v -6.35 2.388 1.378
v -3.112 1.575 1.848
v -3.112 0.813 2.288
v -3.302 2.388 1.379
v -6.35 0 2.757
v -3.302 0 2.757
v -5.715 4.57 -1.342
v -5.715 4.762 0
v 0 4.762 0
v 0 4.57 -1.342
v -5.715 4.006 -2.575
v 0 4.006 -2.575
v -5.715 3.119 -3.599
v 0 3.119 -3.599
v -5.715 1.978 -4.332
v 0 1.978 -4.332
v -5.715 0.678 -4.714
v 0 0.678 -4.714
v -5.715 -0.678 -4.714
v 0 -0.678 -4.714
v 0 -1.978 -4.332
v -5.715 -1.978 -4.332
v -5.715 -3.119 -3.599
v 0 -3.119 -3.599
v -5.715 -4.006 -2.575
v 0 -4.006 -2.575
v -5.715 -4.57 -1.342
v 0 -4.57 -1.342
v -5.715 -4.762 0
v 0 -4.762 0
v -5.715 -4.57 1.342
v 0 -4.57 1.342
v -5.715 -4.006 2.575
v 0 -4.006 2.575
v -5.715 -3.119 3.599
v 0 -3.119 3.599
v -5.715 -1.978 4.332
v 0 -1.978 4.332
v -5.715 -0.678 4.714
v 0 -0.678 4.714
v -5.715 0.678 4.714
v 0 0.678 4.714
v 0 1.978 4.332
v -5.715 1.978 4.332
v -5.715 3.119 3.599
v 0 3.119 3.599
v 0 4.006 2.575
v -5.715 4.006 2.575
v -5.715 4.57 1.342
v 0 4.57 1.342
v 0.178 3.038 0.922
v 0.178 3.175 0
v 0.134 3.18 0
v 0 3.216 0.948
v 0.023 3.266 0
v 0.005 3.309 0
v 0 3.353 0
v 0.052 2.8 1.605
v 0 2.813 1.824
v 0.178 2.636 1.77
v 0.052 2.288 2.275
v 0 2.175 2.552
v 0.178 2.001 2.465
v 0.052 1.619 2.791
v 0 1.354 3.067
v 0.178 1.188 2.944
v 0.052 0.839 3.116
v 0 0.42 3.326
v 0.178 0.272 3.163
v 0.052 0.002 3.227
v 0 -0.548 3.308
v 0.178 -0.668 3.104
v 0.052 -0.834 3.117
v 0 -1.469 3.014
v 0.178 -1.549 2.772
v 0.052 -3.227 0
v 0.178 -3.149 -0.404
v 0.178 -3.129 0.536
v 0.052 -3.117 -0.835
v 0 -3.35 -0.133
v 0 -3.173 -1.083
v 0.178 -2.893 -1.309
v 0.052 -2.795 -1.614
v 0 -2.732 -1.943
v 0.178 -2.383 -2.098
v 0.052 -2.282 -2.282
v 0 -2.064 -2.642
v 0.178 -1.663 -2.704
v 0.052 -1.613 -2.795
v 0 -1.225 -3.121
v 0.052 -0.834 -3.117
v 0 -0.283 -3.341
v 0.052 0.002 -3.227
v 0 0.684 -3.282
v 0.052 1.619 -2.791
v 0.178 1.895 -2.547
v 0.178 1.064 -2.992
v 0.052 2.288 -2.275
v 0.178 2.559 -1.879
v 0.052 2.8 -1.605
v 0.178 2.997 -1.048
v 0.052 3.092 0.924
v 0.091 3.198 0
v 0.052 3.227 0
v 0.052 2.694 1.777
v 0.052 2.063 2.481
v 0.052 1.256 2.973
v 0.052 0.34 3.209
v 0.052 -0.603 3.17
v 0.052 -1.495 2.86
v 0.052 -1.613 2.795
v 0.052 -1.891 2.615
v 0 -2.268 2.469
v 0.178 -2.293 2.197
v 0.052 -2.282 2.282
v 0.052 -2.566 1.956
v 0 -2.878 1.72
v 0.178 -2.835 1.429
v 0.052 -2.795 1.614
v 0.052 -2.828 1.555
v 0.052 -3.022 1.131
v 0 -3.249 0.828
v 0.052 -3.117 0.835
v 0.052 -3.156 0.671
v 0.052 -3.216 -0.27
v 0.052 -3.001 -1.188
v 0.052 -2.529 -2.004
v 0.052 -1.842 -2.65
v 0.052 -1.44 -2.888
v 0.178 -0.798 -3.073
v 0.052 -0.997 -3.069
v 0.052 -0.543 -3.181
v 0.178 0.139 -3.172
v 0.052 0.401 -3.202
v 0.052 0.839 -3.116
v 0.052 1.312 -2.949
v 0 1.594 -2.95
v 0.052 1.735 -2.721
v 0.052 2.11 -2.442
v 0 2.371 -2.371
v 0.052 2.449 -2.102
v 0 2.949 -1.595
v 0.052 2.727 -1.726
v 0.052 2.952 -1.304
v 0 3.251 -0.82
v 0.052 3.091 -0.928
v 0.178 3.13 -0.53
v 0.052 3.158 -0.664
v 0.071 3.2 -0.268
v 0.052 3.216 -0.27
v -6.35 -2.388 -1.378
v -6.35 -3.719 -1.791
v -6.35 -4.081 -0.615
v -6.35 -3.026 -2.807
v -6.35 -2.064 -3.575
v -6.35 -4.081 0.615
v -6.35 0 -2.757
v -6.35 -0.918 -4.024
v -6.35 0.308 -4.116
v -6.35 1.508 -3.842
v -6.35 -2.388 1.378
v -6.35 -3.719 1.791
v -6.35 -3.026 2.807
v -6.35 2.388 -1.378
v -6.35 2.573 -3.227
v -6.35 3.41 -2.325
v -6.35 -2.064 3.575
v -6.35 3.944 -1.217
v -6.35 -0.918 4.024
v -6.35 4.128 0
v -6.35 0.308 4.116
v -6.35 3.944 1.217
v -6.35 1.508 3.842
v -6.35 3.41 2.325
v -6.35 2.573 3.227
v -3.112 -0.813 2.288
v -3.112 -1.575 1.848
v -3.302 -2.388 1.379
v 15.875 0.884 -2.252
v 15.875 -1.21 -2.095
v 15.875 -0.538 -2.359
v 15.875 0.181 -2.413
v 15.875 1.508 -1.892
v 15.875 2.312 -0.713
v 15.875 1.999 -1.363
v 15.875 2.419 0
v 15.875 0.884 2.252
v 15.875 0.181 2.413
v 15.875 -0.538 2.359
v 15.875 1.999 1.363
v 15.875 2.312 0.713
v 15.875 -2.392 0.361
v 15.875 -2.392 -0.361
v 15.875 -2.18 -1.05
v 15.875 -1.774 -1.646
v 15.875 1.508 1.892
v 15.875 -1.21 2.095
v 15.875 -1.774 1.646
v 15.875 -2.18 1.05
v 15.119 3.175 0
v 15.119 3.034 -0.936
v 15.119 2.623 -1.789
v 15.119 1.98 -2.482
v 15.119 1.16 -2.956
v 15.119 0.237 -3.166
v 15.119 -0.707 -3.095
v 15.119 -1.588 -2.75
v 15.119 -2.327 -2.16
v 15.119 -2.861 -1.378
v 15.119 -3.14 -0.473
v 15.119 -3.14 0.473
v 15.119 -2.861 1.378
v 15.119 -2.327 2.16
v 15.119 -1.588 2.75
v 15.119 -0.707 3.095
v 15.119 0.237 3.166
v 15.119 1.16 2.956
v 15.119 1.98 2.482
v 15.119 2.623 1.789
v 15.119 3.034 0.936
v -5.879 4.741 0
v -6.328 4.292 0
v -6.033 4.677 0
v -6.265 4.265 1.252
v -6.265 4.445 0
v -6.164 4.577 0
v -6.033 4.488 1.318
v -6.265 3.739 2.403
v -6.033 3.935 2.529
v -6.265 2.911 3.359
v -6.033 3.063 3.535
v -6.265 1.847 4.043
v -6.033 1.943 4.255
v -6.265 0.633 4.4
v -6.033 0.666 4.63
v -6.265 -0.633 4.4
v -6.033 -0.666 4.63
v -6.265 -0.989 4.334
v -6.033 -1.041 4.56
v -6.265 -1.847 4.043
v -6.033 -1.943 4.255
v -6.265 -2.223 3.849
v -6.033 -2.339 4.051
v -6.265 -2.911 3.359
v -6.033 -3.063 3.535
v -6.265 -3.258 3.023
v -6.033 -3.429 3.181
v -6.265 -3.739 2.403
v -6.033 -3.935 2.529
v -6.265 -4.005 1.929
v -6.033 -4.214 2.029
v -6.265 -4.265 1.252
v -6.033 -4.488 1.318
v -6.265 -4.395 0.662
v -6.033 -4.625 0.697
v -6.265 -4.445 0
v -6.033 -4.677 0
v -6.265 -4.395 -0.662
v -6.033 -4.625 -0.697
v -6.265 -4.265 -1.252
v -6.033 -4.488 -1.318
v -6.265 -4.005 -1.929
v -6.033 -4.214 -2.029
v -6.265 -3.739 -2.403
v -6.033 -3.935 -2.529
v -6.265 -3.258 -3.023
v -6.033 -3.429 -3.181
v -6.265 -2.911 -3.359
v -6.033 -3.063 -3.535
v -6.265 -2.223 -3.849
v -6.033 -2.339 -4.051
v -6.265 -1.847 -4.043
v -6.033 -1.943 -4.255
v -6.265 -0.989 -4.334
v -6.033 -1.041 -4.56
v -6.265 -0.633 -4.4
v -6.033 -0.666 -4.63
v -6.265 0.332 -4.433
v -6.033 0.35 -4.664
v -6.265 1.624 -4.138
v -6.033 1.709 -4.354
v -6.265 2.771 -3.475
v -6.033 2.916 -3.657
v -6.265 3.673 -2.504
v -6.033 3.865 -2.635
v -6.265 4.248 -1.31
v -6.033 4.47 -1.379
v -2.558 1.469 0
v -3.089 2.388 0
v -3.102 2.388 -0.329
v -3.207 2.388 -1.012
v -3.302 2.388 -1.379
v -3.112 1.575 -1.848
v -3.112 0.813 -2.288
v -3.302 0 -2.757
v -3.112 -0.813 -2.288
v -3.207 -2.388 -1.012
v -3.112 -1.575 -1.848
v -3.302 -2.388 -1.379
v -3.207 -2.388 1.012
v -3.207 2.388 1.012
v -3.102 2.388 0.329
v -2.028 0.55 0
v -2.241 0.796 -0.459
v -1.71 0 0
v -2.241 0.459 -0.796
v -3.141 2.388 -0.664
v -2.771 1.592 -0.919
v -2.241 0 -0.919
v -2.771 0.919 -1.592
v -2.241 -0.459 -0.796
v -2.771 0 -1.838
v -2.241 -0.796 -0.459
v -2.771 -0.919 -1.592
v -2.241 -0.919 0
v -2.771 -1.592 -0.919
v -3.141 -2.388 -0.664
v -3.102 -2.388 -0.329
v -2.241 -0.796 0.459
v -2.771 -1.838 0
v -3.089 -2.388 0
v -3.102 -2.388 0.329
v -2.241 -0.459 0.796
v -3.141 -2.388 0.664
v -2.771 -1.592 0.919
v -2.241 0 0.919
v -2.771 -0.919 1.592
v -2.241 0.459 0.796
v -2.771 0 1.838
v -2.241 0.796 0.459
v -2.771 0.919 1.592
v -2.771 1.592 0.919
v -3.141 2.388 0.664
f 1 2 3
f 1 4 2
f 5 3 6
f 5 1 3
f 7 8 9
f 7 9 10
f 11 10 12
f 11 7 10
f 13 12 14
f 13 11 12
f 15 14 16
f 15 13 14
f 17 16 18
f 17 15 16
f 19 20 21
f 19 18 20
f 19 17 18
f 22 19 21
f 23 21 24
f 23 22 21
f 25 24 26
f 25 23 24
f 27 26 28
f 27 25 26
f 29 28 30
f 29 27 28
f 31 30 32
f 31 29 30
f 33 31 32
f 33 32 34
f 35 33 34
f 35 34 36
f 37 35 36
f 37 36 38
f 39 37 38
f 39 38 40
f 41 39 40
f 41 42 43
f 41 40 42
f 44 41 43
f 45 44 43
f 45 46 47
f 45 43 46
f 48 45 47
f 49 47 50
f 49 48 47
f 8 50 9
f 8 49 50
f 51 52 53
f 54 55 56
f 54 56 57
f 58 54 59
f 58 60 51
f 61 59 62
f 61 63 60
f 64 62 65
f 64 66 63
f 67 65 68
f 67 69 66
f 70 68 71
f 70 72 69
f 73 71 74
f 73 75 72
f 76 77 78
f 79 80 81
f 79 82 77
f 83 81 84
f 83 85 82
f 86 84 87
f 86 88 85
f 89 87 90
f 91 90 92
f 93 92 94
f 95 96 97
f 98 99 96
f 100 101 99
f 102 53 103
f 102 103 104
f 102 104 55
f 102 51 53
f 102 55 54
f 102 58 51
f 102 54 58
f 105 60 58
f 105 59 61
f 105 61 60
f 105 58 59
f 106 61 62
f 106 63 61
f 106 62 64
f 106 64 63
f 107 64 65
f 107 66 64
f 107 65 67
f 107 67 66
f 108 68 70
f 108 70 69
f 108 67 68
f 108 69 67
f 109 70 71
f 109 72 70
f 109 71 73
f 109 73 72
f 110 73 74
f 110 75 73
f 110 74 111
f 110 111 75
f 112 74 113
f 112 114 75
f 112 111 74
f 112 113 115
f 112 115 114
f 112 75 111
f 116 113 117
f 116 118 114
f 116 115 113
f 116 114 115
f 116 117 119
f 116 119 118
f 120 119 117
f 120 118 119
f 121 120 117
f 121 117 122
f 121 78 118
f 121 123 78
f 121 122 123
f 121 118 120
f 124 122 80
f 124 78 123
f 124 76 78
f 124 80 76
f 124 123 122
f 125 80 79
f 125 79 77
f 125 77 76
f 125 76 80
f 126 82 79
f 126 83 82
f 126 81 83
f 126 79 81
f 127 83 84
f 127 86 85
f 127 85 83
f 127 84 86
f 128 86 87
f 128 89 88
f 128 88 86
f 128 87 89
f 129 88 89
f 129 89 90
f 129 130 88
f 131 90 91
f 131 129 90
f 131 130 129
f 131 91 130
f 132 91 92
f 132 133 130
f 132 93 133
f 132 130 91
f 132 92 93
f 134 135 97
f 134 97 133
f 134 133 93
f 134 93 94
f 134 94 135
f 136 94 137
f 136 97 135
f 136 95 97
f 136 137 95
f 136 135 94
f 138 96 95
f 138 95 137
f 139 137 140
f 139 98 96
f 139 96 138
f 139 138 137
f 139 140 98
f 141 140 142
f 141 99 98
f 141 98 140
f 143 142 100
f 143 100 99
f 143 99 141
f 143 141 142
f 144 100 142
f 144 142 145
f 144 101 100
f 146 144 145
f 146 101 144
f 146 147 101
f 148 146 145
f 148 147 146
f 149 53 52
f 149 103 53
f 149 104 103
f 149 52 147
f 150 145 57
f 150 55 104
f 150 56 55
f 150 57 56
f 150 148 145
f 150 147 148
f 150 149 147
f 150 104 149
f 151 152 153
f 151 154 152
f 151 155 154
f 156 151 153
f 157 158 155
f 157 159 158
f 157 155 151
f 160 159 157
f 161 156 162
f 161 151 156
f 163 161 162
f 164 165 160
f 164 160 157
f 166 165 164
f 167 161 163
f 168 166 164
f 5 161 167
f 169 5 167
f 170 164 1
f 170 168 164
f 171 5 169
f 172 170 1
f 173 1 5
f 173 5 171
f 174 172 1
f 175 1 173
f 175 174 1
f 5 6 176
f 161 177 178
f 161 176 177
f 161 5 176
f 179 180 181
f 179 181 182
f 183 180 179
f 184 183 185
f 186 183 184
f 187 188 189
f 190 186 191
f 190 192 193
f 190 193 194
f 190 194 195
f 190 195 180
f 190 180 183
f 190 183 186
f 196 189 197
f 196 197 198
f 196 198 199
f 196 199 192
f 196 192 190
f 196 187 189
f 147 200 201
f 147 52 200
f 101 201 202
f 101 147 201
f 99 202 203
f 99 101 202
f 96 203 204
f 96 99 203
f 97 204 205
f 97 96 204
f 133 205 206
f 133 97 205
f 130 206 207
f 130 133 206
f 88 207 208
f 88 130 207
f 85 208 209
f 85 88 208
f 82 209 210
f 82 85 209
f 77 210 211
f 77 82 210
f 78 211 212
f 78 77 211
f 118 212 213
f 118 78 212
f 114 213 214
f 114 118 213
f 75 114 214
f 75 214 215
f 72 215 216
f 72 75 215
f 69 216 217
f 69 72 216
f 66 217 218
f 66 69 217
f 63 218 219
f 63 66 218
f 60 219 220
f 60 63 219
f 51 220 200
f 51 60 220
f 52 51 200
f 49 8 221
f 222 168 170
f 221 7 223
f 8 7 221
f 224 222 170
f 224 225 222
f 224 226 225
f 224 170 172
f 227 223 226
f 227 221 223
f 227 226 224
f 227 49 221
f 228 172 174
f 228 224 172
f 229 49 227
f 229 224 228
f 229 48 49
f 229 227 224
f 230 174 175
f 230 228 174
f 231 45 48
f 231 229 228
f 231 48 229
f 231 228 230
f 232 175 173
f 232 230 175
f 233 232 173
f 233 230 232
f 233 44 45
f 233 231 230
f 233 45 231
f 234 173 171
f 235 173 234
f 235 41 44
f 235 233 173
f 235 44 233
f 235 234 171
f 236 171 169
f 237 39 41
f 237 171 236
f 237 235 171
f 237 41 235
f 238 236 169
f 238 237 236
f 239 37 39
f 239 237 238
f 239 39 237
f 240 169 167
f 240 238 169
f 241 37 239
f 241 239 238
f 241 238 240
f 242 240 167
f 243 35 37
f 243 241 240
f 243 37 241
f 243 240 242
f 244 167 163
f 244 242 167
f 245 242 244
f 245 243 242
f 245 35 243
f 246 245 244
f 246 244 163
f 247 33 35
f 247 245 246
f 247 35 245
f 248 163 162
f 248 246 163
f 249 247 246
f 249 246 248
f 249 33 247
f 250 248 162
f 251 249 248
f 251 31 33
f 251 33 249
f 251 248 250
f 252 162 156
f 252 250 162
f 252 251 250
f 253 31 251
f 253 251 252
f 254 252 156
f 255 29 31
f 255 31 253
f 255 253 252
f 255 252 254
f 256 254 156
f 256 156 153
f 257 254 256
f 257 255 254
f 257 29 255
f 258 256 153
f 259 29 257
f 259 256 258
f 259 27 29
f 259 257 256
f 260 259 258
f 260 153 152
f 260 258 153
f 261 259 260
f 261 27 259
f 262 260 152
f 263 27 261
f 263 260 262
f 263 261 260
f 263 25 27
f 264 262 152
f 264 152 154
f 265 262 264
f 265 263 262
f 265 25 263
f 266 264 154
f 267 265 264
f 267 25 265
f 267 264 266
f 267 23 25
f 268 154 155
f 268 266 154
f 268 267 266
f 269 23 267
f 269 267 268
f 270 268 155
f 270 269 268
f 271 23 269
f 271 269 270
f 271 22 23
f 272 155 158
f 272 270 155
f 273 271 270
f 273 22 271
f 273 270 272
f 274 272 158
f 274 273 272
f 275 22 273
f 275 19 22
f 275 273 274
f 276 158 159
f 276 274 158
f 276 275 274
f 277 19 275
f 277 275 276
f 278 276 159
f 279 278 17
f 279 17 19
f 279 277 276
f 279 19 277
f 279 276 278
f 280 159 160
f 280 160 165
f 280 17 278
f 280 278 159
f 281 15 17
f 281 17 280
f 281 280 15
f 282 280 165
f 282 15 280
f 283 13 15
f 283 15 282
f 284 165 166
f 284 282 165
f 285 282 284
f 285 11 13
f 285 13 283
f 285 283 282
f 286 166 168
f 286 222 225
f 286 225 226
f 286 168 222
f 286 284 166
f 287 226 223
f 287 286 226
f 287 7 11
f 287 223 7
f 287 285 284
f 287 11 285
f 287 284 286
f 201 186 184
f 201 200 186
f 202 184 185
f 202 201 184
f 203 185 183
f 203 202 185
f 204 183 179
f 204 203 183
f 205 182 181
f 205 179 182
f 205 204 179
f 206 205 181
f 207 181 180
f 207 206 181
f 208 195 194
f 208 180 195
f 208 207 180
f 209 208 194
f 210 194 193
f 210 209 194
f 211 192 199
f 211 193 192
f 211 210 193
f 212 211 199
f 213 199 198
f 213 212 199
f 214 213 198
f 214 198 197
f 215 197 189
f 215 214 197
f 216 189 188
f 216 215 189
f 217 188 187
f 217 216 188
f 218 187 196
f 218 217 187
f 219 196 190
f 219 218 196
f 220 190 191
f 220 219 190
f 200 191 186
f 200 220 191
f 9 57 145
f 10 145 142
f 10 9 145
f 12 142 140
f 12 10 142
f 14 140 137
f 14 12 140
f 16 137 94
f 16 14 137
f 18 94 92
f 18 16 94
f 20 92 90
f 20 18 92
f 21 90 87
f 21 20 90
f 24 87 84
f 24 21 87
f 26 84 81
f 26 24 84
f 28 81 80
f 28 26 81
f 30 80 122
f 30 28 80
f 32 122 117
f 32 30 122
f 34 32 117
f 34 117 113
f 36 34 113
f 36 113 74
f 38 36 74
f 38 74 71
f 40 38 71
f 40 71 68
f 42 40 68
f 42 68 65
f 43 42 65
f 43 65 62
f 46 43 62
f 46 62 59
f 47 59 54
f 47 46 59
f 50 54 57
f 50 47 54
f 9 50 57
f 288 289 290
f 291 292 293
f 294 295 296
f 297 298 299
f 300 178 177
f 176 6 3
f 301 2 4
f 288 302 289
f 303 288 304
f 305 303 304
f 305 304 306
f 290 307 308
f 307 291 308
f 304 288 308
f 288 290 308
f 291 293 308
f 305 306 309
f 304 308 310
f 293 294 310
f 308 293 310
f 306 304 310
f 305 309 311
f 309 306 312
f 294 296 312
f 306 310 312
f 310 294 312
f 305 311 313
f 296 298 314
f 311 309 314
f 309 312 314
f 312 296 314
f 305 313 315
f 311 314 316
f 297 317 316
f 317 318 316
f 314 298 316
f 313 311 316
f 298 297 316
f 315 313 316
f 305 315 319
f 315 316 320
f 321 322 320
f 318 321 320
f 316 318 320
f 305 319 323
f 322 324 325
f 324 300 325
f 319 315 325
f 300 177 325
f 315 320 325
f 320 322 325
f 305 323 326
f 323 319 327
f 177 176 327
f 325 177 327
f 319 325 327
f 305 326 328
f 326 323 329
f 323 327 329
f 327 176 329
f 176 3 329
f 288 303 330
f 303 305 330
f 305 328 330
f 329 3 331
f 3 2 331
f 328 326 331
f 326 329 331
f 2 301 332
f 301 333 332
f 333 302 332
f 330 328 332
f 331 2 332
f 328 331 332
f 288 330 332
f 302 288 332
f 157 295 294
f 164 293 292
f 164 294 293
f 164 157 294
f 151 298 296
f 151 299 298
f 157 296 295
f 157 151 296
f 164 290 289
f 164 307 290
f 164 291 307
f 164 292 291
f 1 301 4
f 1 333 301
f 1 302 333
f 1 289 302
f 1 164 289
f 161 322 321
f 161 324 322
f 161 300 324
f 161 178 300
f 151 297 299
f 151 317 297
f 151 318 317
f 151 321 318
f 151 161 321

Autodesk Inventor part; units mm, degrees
ref_plane "YZ Plane" through (0, 0, 0) normal (1, 0, 0) x (0, 1, 0)
ref_plane "XZ Plane" through (0, 0, 0) normal (0, 1, 0) x (-1, 0, 0)
sketch "Sketch1" plane through (0, 0, 0) normal (0, 0, 1) x (1, 0, 0)
  line L0 (-1.7103, 0) -> (15.875, 0)
  line L1 (15.875, 0) -> (15.875, 3.175)
  line L2 (15.875, 3.175) -> (3.1752, 3.175)
  line L3 (3.1752, 3.175) -> (0.0001, 3.175)
  line L4 (0.0001, 3.175) -> (0, 3.175)
  line L5 (0, 3.175) -> (0, 4.7625)
  line L6 (0, 4.7625) -> (-6.35, 4.7625)
  line L7 (-6.35, 4.7625) -> (-6.35, 2.757)
  line L8 (-6.35, 2.757) -> (-3.302, 2.757)
  line L9 (-3.302, 2.757) -> (-1.7103, 0)
  line L10 (-10.795, 0) -> (20.32, 0) projected
  line L11 (0, -0.9525) -> (0, 5.715) projected
  line L12 (3.1752, 3.175) -> (0, 3.175) construction
  dimension "d1" = 12.6998
  dimension "d2" = 3.1751
  dimension "d3" = 6.35
  dimension "d4" = 3.048
  dimension "d5" = 60
  dimension "d6" = 6.35
  dimension "d7" = 6.35
  dimension "d8" = 5.5139
  dimension "d9" = 9.525
  dimension "d26" = 15.875
revolve "Body" add sketch "Sketch1" angle 360 about axis through (-1.7103, 0, 0) along (1, 0, 0)
sketch "Sketch2" plane through (-6.35, 0, 0) normal (-1, 0, 0) x (0, 0, 1)
  circle A0 centre (0, 0) radius 2.757 projected
  line L0 (0, -6.6675) -> (0, 6.6675) projected
  line L1 (-6.6675, 0) -> (6.6675, 0) projected
  line L2 (2.757, 0) -> (1.3785, -2.3876)
  line L3 (1.3785, -2.3876) -> (-1.3785, -2.3876)
  line L4 (-1.3785, -2.3876) -> (-2.757, 0)
  line L5 (-2.757, 0) -> (-1.3785, 2.3876)
  line L6 (-1.3785, 2.3876) -> (1.3785, 2.3876)
  line L7 (1.3785, 2.3876) -> (2.757, 0)
extrude "Slot" add sketch "Sketch2" against normal up to next contours L7 A0 | A0 L2 | L6 L0 A0 | A0 L0 L3 | L0 L6 A0 | A0 L3 L0 | L4 A0 | A0 L5
fillet "Fillet1" radius 0.635 1 edges at (-6.35, -4.7625, 0)
thread "Thread" size "1/4-20 UNC" class "2A" standard "ANSI Unified Screw Threads" length 12.6998
chamfer "Chamfer1" distance 0.7556 distance2 0.7556 1 edges at (15.875, -3.175, 0) measured on face at (15.875, 0.0983, -0.8099)
ref_plane "Work Plane1" through (29, 0, 0) normal (0, -1, 0) x (1, 0, 0)
fillet "Fillet2" radius 0.1778 1 edges at (0.0001, -3.175, 0)
equation "\"d30\" = R"
equation "\"d17\" = RR"
equation "\"d13\" = GEL"
equation "\"d15\" = -0.5 * SPD + 0.5 * GD"
equation "\"d16\" = GUL"
equation "\"d1\" = GEL"
equation "\"d3\" = KOH"
equation "\"d4\" = INTI"
equation "\"d6\" = GD"
equation "\"d7\" = BDM"
equation "\"d8\" = 1.1547 * SW"
equation "\"d9\" = KOD"
equation "\"d26\" = NLG"
equation "\"GD\" = 6.35"
equation "\"NLG\" = 15.875"
equation "\"GEL\" = 12.6998"
equation "\"KOD\" = 9.525"
equation "\"KOH\" = 6.35"
equation "\"INTI\" = 3.048"
equation "\"GAL\" = 3.175"
equation "\"GUL\" = 0.75565"
equation "\"BDM\" = 6.35"
equation "\"SW\" = 4.7752"
equation "\"RR\" = 0.635"
equation "\"SPD\" = 4.8387"
equation "\"R\" = 0.1778"
equation "\"PHH\" = 0.2032"
equation "\"GD1\" = SPD"
equation "\"THREADDIA\" = 6.35"
equation "\"FAWI\" = 45deg"
equation "\"KOH1\" = 5.715"
equation "\"NND\" = 6.35"
equation "\"TOA\" = 30deg"
equation "\"E0\" = 1.155 * SW"
properties part number "ANSI B18.3 - 1/4 - 20 UNC - 5/8 HS HCS" material "Steel, Mild"
